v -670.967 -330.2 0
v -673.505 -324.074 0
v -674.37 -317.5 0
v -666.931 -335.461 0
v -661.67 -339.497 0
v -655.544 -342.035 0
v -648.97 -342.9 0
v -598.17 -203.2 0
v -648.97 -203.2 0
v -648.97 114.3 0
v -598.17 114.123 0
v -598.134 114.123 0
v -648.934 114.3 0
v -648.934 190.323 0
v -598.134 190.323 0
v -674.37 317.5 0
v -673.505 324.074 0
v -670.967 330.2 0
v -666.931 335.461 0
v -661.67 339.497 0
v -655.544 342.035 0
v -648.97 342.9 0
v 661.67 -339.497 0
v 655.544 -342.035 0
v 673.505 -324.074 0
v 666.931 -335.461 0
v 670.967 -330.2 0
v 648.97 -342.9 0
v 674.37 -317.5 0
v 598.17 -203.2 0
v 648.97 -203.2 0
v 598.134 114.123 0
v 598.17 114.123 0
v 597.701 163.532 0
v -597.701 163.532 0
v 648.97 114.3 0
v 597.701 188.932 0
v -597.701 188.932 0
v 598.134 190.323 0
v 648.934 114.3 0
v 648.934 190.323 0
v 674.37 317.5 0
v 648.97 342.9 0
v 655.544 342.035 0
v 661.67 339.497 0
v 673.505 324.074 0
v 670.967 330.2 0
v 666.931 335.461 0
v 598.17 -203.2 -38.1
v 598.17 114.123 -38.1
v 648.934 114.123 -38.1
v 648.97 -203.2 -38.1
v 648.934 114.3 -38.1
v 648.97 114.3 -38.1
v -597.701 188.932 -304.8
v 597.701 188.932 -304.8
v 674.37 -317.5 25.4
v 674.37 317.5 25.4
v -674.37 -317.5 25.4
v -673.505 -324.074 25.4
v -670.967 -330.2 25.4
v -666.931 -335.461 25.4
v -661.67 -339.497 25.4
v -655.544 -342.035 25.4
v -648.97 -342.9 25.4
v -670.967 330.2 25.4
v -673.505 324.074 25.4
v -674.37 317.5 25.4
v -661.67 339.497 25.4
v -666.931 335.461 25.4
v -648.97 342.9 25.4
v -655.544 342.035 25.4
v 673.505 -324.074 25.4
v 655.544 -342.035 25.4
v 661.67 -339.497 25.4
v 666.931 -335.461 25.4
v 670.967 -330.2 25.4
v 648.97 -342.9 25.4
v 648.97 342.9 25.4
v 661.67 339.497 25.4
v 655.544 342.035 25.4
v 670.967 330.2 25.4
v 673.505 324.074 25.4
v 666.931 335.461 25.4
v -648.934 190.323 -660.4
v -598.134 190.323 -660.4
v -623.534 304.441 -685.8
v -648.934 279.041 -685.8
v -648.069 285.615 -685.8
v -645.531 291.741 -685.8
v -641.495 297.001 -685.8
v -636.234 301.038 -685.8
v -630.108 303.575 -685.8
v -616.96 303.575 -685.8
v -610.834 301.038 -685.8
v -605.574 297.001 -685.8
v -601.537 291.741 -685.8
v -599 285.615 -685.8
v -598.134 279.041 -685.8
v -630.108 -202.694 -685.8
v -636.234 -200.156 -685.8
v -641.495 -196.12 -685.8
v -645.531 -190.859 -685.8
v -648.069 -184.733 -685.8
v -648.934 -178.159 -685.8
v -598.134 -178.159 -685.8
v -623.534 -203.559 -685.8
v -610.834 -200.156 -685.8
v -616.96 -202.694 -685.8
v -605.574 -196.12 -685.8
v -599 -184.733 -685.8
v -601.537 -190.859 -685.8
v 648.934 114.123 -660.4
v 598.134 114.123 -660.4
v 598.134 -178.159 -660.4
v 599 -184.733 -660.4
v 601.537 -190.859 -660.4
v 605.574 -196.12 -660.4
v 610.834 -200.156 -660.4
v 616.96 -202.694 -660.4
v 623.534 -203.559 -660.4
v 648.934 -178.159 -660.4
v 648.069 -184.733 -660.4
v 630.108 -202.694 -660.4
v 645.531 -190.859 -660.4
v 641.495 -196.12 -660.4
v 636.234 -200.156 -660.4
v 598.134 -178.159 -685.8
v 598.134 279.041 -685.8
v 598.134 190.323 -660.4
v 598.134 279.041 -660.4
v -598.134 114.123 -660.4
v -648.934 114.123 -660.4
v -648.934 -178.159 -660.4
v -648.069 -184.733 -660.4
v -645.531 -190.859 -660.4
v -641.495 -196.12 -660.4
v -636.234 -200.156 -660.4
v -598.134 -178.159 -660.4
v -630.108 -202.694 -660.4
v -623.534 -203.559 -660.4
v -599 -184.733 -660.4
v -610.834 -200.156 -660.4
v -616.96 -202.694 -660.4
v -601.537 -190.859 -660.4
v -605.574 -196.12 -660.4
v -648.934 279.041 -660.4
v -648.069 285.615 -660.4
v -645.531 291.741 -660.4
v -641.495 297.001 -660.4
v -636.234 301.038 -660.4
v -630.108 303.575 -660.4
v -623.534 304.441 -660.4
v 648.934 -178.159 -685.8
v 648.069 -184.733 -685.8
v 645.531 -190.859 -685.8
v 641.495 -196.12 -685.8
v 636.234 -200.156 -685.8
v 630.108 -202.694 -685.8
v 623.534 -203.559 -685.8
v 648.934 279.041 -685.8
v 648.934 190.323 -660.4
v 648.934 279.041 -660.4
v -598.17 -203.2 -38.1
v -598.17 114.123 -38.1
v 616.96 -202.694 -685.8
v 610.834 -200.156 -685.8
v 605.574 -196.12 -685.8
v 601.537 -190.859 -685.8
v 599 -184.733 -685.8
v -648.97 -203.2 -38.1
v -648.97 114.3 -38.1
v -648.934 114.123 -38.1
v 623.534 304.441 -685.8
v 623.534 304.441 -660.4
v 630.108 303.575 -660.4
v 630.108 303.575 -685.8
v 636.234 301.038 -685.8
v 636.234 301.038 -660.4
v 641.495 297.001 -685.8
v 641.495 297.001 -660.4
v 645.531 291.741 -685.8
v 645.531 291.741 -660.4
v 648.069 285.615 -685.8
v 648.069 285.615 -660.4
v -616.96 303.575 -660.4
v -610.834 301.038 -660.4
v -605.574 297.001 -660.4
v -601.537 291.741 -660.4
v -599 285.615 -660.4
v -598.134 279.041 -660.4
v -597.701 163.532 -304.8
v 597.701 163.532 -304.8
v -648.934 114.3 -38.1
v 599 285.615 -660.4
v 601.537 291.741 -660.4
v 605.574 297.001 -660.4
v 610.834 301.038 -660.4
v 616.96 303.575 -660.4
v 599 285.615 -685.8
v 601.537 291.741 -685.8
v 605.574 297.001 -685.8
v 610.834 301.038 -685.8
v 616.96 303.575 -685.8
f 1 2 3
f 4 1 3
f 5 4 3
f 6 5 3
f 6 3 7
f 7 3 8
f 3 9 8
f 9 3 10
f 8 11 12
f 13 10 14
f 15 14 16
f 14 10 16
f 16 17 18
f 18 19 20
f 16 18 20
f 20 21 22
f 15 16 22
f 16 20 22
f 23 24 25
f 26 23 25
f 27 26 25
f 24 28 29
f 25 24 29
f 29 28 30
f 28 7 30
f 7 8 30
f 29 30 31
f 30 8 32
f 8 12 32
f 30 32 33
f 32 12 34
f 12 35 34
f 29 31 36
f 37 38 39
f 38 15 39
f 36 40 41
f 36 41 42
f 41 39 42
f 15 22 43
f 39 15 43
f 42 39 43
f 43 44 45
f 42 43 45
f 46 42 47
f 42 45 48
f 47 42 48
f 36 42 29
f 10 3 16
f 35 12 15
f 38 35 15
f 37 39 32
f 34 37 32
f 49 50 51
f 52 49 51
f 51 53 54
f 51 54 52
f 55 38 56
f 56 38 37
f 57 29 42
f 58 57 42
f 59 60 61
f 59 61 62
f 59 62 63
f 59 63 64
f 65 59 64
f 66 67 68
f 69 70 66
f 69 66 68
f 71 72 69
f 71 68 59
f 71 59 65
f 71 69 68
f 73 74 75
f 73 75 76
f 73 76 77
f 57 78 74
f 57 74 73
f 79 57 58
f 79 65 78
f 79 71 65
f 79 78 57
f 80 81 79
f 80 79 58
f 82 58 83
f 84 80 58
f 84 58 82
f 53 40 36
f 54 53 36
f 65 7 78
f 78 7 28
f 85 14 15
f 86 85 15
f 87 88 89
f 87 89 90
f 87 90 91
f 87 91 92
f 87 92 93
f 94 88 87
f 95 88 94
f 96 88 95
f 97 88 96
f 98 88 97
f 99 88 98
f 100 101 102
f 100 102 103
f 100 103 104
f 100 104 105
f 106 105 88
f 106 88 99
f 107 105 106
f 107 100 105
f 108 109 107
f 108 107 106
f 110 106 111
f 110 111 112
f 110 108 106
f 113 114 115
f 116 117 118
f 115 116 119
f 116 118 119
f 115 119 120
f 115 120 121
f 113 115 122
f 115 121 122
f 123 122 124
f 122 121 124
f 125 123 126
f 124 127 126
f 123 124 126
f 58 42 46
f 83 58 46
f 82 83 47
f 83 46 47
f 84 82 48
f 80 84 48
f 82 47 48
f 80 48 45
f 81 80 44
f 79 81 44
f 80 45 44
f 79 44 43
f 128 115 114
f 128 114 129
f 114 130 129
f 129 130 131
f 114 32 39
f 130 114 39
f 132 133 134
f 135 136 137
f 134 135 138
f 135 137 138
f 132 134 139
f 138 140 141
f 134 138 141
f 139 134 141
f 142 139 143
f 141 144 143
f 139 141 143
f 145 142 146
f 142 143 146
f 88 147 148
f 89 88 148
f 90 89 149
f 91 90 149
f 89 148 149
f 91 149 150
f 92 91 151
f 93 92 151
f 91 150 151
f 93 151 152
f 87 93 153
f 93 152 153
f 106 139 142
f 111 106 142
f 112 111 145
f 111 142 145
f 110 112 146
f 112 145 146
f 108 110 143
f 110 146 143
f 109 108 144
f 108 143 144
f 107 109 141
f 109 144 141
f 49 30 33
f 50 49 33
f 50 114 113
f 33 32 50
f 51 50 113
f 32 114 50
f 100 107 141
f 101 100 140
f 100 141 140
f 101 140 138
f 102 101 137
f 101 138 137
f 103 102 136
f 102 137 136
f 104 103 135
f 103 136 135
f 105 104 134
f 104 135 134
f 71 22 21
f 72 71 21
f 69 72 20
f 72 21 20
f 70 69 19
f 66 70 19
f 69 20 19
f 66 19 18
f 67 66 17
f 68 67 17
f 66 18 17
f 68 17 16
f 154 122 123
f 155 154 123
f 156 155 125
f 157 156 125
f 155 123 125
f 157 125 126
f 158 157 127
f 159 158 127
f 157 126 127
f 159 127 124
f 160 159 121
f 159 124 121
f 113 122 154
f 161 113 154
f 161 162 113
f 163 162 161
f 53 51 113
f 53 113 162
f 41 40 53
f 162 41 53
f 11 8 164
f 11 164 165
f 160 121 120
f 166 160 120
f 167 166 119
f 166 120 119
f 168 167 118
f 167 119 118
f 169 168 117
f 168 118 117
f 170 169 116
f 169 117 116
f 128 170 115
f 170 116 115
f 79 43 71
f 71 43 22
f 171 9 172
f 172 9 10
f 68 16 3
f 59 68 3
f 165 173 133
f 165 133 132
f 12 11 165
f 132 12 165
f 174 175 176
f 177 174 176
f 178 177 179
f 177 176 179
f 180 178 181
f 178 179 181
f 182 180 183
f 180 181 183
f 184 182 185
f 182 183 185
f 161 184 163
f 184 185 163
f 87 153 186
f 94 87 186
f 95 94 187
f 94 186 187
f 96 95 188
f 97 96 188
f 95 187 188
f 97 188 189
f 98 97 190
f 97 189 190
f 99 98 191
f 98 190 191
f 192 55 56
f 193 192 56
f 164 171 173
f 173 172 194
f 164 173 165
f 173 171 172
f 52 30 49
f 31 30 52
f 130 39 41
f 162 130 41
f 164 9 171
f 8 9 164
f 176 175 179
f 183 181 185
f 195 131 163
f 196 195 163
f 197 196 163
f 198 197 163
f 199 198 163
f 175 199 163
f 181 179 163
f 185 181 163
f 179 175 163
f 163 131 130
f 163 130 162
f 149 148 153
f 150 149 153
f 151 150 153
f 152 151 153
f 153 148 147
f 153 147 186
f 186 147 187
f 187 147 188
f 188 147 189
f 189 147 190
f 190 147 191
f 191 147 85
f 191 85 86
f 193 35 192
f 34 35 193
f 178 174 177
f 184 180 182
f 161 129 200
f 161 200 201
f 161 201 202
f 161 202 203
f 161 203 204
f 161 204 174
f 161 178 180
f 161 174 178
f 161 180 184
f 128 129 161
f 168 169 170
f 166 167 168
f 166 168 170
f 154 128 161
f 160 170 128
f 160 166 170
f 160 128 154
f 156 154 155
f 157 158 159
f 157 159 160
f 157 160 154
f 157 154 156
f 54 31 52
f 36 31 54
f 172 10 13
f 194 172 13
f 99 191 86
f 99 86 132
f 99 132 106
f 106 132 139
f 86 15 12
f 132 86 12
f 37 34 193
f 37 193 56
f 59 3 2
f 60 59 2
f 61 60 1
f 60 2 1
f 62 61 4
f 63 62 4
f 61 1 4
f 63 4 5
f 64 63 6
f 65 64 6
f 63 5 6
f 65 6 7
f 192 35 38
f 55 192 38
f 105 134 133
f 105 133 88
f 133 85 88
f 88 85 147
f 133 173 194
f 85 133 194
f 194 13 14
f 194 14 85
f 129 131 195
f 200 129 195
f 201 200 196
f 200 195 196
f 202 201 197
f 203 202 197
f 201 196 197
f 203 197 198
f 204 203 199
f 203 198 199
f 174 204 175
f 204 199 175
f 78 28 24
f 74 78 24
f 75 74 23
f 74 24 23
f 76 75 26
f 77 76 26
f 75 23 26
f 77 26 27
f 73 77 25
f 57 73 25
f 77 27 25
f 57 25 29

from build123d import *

# Parameters (mm, degrees)
F1_DEPTH = 25.4
F2_W     = 50.8
F2_H     = 317.5
F3_DEPTH = 38.1
F4_W     = 50.8
F4_H     = 76.2
F5_DEPTH = 660.4
F6_W     = 1195.401192
F6_H     = 25.4
F7_DEPTH = 304.8
F9_DEPTH = 25.4


with BuildPart() as f1:
    # F0 (on Top) → F1 (new body)
    with BuildSketch(Plane.XY):
        with BuildLine():
            Line((0, -342.9), (648.97, -342.9))
            ThreePointArc((648.97, -342.9), (666.930512, -335.460512), (674.37, -317.5))
            Line((674.37, -317.5), (674.37, 317.5))
            ThreePointArc((674.37, 317.5), (666.930512, 335.460512), (648.97, 342.9))
            Line((648.97, 342.9), (0, 342.9))
            Line((0, 342.9), (0, -342.9))
        make_face()
        with BuildLine():
            Line((-648.97, -342.9), (0, -342.9))
            Line((0, -342.9), (0, 342.9))
            Line((0, 342.9), (-648.97, 342.9))
            ThreePointArc((-648.97, 342.9), (-666.930512, 335.460512), (-674.37, 317.5))
            Line((-674.37, 317.5), (-674.37, -317.5))
            ThreePointArc((-674.37, -317.5), (-666.930512, -335.460512), (-648.97, -342.9))
        make_face()
    extrude(amount=F1_DEPTH)

    # F2 (on Top) → F3 (join)
    with BuildSketch(Plane.XY):
        with Locations((-623.57, -44.45)):
            Rectangle(F2_W, F2_H)
        with Locations((623.57, -44.45)):
            Rectangle(F2_W, F2_H)
    extrude(amount=-F3_DEPTH)

    # F4 (on face) → F5 (join)
    with BuildSketch(Plane.XY):
        with Locations((-623.534083, 152.223289)):
            Rectangle(F4_W, F4_H)
        with Locations((623.534083, 152.223289)):
            Rectangle(F4_W, F4_H)
    extrude(amount=-F5_DEPTH)

    # F6 (on Top) → F7 (join)
    with BuildSketch(Plane.XY):
        with Locations((0, 176.231914)):
            Rectangle(F6_W, F6_H)
    extrude(amount=-F7_DEPTH)

    # F8 (on face) → F9 (join)
    with BuildSketch(Plane(origin=(0, 0, -660.4), x_dir=(1, 0, 0), z_dir=(0, 0, -1))):
        with BuildLine():
            ThreePointArc((-623.534083, 203.559189), (-641.494596, 196.119702), (-648.934083, 178.159189))
            Line((-648.934083, 178.159189), (-648.934083, -279.040811))
            ThreePointArc((-648.934083, -279.040811), (-641.494596, -297.001323), (-623.534083, -304.440811))
            ThreePointArc((-623.534083, -304.440811), (-605.573571, -297.001323), (-598.134083, -279.040811))
            Line((-598.134083, -279.040811), (-598.134083, 178.159189))
            ThreePointArc((-598.134083, 178.159189), (-605.573571, 196.119702), (-623.534083, 203.559189))
        make_face()
        with BuildLine():
            ThreePointArc((623.534083, 203.559189), (605.573571, 196.119702), (598.134083, 178.159189))
            Line((598.134083, 178.159189), (598.134083, -279.040811))
            ThreePointArc((598.134083, -279.040811), (605.573571, -297.001323), (623.534083, -304.440811))
            ThreePointArc((623.534083, -304.440811), (641.494596, -297.001323), (648.934083, -279.040811))
            Line((648.934083, -279.040811), (648.934083, 178.159189))
            ThreePointArc((648.934083, 178.159189), (641.494596, 196.119702), (623.534083, 203.559189))
        make_face()
    extrude(amount=F9_DEPTH)


solid = f1.part
